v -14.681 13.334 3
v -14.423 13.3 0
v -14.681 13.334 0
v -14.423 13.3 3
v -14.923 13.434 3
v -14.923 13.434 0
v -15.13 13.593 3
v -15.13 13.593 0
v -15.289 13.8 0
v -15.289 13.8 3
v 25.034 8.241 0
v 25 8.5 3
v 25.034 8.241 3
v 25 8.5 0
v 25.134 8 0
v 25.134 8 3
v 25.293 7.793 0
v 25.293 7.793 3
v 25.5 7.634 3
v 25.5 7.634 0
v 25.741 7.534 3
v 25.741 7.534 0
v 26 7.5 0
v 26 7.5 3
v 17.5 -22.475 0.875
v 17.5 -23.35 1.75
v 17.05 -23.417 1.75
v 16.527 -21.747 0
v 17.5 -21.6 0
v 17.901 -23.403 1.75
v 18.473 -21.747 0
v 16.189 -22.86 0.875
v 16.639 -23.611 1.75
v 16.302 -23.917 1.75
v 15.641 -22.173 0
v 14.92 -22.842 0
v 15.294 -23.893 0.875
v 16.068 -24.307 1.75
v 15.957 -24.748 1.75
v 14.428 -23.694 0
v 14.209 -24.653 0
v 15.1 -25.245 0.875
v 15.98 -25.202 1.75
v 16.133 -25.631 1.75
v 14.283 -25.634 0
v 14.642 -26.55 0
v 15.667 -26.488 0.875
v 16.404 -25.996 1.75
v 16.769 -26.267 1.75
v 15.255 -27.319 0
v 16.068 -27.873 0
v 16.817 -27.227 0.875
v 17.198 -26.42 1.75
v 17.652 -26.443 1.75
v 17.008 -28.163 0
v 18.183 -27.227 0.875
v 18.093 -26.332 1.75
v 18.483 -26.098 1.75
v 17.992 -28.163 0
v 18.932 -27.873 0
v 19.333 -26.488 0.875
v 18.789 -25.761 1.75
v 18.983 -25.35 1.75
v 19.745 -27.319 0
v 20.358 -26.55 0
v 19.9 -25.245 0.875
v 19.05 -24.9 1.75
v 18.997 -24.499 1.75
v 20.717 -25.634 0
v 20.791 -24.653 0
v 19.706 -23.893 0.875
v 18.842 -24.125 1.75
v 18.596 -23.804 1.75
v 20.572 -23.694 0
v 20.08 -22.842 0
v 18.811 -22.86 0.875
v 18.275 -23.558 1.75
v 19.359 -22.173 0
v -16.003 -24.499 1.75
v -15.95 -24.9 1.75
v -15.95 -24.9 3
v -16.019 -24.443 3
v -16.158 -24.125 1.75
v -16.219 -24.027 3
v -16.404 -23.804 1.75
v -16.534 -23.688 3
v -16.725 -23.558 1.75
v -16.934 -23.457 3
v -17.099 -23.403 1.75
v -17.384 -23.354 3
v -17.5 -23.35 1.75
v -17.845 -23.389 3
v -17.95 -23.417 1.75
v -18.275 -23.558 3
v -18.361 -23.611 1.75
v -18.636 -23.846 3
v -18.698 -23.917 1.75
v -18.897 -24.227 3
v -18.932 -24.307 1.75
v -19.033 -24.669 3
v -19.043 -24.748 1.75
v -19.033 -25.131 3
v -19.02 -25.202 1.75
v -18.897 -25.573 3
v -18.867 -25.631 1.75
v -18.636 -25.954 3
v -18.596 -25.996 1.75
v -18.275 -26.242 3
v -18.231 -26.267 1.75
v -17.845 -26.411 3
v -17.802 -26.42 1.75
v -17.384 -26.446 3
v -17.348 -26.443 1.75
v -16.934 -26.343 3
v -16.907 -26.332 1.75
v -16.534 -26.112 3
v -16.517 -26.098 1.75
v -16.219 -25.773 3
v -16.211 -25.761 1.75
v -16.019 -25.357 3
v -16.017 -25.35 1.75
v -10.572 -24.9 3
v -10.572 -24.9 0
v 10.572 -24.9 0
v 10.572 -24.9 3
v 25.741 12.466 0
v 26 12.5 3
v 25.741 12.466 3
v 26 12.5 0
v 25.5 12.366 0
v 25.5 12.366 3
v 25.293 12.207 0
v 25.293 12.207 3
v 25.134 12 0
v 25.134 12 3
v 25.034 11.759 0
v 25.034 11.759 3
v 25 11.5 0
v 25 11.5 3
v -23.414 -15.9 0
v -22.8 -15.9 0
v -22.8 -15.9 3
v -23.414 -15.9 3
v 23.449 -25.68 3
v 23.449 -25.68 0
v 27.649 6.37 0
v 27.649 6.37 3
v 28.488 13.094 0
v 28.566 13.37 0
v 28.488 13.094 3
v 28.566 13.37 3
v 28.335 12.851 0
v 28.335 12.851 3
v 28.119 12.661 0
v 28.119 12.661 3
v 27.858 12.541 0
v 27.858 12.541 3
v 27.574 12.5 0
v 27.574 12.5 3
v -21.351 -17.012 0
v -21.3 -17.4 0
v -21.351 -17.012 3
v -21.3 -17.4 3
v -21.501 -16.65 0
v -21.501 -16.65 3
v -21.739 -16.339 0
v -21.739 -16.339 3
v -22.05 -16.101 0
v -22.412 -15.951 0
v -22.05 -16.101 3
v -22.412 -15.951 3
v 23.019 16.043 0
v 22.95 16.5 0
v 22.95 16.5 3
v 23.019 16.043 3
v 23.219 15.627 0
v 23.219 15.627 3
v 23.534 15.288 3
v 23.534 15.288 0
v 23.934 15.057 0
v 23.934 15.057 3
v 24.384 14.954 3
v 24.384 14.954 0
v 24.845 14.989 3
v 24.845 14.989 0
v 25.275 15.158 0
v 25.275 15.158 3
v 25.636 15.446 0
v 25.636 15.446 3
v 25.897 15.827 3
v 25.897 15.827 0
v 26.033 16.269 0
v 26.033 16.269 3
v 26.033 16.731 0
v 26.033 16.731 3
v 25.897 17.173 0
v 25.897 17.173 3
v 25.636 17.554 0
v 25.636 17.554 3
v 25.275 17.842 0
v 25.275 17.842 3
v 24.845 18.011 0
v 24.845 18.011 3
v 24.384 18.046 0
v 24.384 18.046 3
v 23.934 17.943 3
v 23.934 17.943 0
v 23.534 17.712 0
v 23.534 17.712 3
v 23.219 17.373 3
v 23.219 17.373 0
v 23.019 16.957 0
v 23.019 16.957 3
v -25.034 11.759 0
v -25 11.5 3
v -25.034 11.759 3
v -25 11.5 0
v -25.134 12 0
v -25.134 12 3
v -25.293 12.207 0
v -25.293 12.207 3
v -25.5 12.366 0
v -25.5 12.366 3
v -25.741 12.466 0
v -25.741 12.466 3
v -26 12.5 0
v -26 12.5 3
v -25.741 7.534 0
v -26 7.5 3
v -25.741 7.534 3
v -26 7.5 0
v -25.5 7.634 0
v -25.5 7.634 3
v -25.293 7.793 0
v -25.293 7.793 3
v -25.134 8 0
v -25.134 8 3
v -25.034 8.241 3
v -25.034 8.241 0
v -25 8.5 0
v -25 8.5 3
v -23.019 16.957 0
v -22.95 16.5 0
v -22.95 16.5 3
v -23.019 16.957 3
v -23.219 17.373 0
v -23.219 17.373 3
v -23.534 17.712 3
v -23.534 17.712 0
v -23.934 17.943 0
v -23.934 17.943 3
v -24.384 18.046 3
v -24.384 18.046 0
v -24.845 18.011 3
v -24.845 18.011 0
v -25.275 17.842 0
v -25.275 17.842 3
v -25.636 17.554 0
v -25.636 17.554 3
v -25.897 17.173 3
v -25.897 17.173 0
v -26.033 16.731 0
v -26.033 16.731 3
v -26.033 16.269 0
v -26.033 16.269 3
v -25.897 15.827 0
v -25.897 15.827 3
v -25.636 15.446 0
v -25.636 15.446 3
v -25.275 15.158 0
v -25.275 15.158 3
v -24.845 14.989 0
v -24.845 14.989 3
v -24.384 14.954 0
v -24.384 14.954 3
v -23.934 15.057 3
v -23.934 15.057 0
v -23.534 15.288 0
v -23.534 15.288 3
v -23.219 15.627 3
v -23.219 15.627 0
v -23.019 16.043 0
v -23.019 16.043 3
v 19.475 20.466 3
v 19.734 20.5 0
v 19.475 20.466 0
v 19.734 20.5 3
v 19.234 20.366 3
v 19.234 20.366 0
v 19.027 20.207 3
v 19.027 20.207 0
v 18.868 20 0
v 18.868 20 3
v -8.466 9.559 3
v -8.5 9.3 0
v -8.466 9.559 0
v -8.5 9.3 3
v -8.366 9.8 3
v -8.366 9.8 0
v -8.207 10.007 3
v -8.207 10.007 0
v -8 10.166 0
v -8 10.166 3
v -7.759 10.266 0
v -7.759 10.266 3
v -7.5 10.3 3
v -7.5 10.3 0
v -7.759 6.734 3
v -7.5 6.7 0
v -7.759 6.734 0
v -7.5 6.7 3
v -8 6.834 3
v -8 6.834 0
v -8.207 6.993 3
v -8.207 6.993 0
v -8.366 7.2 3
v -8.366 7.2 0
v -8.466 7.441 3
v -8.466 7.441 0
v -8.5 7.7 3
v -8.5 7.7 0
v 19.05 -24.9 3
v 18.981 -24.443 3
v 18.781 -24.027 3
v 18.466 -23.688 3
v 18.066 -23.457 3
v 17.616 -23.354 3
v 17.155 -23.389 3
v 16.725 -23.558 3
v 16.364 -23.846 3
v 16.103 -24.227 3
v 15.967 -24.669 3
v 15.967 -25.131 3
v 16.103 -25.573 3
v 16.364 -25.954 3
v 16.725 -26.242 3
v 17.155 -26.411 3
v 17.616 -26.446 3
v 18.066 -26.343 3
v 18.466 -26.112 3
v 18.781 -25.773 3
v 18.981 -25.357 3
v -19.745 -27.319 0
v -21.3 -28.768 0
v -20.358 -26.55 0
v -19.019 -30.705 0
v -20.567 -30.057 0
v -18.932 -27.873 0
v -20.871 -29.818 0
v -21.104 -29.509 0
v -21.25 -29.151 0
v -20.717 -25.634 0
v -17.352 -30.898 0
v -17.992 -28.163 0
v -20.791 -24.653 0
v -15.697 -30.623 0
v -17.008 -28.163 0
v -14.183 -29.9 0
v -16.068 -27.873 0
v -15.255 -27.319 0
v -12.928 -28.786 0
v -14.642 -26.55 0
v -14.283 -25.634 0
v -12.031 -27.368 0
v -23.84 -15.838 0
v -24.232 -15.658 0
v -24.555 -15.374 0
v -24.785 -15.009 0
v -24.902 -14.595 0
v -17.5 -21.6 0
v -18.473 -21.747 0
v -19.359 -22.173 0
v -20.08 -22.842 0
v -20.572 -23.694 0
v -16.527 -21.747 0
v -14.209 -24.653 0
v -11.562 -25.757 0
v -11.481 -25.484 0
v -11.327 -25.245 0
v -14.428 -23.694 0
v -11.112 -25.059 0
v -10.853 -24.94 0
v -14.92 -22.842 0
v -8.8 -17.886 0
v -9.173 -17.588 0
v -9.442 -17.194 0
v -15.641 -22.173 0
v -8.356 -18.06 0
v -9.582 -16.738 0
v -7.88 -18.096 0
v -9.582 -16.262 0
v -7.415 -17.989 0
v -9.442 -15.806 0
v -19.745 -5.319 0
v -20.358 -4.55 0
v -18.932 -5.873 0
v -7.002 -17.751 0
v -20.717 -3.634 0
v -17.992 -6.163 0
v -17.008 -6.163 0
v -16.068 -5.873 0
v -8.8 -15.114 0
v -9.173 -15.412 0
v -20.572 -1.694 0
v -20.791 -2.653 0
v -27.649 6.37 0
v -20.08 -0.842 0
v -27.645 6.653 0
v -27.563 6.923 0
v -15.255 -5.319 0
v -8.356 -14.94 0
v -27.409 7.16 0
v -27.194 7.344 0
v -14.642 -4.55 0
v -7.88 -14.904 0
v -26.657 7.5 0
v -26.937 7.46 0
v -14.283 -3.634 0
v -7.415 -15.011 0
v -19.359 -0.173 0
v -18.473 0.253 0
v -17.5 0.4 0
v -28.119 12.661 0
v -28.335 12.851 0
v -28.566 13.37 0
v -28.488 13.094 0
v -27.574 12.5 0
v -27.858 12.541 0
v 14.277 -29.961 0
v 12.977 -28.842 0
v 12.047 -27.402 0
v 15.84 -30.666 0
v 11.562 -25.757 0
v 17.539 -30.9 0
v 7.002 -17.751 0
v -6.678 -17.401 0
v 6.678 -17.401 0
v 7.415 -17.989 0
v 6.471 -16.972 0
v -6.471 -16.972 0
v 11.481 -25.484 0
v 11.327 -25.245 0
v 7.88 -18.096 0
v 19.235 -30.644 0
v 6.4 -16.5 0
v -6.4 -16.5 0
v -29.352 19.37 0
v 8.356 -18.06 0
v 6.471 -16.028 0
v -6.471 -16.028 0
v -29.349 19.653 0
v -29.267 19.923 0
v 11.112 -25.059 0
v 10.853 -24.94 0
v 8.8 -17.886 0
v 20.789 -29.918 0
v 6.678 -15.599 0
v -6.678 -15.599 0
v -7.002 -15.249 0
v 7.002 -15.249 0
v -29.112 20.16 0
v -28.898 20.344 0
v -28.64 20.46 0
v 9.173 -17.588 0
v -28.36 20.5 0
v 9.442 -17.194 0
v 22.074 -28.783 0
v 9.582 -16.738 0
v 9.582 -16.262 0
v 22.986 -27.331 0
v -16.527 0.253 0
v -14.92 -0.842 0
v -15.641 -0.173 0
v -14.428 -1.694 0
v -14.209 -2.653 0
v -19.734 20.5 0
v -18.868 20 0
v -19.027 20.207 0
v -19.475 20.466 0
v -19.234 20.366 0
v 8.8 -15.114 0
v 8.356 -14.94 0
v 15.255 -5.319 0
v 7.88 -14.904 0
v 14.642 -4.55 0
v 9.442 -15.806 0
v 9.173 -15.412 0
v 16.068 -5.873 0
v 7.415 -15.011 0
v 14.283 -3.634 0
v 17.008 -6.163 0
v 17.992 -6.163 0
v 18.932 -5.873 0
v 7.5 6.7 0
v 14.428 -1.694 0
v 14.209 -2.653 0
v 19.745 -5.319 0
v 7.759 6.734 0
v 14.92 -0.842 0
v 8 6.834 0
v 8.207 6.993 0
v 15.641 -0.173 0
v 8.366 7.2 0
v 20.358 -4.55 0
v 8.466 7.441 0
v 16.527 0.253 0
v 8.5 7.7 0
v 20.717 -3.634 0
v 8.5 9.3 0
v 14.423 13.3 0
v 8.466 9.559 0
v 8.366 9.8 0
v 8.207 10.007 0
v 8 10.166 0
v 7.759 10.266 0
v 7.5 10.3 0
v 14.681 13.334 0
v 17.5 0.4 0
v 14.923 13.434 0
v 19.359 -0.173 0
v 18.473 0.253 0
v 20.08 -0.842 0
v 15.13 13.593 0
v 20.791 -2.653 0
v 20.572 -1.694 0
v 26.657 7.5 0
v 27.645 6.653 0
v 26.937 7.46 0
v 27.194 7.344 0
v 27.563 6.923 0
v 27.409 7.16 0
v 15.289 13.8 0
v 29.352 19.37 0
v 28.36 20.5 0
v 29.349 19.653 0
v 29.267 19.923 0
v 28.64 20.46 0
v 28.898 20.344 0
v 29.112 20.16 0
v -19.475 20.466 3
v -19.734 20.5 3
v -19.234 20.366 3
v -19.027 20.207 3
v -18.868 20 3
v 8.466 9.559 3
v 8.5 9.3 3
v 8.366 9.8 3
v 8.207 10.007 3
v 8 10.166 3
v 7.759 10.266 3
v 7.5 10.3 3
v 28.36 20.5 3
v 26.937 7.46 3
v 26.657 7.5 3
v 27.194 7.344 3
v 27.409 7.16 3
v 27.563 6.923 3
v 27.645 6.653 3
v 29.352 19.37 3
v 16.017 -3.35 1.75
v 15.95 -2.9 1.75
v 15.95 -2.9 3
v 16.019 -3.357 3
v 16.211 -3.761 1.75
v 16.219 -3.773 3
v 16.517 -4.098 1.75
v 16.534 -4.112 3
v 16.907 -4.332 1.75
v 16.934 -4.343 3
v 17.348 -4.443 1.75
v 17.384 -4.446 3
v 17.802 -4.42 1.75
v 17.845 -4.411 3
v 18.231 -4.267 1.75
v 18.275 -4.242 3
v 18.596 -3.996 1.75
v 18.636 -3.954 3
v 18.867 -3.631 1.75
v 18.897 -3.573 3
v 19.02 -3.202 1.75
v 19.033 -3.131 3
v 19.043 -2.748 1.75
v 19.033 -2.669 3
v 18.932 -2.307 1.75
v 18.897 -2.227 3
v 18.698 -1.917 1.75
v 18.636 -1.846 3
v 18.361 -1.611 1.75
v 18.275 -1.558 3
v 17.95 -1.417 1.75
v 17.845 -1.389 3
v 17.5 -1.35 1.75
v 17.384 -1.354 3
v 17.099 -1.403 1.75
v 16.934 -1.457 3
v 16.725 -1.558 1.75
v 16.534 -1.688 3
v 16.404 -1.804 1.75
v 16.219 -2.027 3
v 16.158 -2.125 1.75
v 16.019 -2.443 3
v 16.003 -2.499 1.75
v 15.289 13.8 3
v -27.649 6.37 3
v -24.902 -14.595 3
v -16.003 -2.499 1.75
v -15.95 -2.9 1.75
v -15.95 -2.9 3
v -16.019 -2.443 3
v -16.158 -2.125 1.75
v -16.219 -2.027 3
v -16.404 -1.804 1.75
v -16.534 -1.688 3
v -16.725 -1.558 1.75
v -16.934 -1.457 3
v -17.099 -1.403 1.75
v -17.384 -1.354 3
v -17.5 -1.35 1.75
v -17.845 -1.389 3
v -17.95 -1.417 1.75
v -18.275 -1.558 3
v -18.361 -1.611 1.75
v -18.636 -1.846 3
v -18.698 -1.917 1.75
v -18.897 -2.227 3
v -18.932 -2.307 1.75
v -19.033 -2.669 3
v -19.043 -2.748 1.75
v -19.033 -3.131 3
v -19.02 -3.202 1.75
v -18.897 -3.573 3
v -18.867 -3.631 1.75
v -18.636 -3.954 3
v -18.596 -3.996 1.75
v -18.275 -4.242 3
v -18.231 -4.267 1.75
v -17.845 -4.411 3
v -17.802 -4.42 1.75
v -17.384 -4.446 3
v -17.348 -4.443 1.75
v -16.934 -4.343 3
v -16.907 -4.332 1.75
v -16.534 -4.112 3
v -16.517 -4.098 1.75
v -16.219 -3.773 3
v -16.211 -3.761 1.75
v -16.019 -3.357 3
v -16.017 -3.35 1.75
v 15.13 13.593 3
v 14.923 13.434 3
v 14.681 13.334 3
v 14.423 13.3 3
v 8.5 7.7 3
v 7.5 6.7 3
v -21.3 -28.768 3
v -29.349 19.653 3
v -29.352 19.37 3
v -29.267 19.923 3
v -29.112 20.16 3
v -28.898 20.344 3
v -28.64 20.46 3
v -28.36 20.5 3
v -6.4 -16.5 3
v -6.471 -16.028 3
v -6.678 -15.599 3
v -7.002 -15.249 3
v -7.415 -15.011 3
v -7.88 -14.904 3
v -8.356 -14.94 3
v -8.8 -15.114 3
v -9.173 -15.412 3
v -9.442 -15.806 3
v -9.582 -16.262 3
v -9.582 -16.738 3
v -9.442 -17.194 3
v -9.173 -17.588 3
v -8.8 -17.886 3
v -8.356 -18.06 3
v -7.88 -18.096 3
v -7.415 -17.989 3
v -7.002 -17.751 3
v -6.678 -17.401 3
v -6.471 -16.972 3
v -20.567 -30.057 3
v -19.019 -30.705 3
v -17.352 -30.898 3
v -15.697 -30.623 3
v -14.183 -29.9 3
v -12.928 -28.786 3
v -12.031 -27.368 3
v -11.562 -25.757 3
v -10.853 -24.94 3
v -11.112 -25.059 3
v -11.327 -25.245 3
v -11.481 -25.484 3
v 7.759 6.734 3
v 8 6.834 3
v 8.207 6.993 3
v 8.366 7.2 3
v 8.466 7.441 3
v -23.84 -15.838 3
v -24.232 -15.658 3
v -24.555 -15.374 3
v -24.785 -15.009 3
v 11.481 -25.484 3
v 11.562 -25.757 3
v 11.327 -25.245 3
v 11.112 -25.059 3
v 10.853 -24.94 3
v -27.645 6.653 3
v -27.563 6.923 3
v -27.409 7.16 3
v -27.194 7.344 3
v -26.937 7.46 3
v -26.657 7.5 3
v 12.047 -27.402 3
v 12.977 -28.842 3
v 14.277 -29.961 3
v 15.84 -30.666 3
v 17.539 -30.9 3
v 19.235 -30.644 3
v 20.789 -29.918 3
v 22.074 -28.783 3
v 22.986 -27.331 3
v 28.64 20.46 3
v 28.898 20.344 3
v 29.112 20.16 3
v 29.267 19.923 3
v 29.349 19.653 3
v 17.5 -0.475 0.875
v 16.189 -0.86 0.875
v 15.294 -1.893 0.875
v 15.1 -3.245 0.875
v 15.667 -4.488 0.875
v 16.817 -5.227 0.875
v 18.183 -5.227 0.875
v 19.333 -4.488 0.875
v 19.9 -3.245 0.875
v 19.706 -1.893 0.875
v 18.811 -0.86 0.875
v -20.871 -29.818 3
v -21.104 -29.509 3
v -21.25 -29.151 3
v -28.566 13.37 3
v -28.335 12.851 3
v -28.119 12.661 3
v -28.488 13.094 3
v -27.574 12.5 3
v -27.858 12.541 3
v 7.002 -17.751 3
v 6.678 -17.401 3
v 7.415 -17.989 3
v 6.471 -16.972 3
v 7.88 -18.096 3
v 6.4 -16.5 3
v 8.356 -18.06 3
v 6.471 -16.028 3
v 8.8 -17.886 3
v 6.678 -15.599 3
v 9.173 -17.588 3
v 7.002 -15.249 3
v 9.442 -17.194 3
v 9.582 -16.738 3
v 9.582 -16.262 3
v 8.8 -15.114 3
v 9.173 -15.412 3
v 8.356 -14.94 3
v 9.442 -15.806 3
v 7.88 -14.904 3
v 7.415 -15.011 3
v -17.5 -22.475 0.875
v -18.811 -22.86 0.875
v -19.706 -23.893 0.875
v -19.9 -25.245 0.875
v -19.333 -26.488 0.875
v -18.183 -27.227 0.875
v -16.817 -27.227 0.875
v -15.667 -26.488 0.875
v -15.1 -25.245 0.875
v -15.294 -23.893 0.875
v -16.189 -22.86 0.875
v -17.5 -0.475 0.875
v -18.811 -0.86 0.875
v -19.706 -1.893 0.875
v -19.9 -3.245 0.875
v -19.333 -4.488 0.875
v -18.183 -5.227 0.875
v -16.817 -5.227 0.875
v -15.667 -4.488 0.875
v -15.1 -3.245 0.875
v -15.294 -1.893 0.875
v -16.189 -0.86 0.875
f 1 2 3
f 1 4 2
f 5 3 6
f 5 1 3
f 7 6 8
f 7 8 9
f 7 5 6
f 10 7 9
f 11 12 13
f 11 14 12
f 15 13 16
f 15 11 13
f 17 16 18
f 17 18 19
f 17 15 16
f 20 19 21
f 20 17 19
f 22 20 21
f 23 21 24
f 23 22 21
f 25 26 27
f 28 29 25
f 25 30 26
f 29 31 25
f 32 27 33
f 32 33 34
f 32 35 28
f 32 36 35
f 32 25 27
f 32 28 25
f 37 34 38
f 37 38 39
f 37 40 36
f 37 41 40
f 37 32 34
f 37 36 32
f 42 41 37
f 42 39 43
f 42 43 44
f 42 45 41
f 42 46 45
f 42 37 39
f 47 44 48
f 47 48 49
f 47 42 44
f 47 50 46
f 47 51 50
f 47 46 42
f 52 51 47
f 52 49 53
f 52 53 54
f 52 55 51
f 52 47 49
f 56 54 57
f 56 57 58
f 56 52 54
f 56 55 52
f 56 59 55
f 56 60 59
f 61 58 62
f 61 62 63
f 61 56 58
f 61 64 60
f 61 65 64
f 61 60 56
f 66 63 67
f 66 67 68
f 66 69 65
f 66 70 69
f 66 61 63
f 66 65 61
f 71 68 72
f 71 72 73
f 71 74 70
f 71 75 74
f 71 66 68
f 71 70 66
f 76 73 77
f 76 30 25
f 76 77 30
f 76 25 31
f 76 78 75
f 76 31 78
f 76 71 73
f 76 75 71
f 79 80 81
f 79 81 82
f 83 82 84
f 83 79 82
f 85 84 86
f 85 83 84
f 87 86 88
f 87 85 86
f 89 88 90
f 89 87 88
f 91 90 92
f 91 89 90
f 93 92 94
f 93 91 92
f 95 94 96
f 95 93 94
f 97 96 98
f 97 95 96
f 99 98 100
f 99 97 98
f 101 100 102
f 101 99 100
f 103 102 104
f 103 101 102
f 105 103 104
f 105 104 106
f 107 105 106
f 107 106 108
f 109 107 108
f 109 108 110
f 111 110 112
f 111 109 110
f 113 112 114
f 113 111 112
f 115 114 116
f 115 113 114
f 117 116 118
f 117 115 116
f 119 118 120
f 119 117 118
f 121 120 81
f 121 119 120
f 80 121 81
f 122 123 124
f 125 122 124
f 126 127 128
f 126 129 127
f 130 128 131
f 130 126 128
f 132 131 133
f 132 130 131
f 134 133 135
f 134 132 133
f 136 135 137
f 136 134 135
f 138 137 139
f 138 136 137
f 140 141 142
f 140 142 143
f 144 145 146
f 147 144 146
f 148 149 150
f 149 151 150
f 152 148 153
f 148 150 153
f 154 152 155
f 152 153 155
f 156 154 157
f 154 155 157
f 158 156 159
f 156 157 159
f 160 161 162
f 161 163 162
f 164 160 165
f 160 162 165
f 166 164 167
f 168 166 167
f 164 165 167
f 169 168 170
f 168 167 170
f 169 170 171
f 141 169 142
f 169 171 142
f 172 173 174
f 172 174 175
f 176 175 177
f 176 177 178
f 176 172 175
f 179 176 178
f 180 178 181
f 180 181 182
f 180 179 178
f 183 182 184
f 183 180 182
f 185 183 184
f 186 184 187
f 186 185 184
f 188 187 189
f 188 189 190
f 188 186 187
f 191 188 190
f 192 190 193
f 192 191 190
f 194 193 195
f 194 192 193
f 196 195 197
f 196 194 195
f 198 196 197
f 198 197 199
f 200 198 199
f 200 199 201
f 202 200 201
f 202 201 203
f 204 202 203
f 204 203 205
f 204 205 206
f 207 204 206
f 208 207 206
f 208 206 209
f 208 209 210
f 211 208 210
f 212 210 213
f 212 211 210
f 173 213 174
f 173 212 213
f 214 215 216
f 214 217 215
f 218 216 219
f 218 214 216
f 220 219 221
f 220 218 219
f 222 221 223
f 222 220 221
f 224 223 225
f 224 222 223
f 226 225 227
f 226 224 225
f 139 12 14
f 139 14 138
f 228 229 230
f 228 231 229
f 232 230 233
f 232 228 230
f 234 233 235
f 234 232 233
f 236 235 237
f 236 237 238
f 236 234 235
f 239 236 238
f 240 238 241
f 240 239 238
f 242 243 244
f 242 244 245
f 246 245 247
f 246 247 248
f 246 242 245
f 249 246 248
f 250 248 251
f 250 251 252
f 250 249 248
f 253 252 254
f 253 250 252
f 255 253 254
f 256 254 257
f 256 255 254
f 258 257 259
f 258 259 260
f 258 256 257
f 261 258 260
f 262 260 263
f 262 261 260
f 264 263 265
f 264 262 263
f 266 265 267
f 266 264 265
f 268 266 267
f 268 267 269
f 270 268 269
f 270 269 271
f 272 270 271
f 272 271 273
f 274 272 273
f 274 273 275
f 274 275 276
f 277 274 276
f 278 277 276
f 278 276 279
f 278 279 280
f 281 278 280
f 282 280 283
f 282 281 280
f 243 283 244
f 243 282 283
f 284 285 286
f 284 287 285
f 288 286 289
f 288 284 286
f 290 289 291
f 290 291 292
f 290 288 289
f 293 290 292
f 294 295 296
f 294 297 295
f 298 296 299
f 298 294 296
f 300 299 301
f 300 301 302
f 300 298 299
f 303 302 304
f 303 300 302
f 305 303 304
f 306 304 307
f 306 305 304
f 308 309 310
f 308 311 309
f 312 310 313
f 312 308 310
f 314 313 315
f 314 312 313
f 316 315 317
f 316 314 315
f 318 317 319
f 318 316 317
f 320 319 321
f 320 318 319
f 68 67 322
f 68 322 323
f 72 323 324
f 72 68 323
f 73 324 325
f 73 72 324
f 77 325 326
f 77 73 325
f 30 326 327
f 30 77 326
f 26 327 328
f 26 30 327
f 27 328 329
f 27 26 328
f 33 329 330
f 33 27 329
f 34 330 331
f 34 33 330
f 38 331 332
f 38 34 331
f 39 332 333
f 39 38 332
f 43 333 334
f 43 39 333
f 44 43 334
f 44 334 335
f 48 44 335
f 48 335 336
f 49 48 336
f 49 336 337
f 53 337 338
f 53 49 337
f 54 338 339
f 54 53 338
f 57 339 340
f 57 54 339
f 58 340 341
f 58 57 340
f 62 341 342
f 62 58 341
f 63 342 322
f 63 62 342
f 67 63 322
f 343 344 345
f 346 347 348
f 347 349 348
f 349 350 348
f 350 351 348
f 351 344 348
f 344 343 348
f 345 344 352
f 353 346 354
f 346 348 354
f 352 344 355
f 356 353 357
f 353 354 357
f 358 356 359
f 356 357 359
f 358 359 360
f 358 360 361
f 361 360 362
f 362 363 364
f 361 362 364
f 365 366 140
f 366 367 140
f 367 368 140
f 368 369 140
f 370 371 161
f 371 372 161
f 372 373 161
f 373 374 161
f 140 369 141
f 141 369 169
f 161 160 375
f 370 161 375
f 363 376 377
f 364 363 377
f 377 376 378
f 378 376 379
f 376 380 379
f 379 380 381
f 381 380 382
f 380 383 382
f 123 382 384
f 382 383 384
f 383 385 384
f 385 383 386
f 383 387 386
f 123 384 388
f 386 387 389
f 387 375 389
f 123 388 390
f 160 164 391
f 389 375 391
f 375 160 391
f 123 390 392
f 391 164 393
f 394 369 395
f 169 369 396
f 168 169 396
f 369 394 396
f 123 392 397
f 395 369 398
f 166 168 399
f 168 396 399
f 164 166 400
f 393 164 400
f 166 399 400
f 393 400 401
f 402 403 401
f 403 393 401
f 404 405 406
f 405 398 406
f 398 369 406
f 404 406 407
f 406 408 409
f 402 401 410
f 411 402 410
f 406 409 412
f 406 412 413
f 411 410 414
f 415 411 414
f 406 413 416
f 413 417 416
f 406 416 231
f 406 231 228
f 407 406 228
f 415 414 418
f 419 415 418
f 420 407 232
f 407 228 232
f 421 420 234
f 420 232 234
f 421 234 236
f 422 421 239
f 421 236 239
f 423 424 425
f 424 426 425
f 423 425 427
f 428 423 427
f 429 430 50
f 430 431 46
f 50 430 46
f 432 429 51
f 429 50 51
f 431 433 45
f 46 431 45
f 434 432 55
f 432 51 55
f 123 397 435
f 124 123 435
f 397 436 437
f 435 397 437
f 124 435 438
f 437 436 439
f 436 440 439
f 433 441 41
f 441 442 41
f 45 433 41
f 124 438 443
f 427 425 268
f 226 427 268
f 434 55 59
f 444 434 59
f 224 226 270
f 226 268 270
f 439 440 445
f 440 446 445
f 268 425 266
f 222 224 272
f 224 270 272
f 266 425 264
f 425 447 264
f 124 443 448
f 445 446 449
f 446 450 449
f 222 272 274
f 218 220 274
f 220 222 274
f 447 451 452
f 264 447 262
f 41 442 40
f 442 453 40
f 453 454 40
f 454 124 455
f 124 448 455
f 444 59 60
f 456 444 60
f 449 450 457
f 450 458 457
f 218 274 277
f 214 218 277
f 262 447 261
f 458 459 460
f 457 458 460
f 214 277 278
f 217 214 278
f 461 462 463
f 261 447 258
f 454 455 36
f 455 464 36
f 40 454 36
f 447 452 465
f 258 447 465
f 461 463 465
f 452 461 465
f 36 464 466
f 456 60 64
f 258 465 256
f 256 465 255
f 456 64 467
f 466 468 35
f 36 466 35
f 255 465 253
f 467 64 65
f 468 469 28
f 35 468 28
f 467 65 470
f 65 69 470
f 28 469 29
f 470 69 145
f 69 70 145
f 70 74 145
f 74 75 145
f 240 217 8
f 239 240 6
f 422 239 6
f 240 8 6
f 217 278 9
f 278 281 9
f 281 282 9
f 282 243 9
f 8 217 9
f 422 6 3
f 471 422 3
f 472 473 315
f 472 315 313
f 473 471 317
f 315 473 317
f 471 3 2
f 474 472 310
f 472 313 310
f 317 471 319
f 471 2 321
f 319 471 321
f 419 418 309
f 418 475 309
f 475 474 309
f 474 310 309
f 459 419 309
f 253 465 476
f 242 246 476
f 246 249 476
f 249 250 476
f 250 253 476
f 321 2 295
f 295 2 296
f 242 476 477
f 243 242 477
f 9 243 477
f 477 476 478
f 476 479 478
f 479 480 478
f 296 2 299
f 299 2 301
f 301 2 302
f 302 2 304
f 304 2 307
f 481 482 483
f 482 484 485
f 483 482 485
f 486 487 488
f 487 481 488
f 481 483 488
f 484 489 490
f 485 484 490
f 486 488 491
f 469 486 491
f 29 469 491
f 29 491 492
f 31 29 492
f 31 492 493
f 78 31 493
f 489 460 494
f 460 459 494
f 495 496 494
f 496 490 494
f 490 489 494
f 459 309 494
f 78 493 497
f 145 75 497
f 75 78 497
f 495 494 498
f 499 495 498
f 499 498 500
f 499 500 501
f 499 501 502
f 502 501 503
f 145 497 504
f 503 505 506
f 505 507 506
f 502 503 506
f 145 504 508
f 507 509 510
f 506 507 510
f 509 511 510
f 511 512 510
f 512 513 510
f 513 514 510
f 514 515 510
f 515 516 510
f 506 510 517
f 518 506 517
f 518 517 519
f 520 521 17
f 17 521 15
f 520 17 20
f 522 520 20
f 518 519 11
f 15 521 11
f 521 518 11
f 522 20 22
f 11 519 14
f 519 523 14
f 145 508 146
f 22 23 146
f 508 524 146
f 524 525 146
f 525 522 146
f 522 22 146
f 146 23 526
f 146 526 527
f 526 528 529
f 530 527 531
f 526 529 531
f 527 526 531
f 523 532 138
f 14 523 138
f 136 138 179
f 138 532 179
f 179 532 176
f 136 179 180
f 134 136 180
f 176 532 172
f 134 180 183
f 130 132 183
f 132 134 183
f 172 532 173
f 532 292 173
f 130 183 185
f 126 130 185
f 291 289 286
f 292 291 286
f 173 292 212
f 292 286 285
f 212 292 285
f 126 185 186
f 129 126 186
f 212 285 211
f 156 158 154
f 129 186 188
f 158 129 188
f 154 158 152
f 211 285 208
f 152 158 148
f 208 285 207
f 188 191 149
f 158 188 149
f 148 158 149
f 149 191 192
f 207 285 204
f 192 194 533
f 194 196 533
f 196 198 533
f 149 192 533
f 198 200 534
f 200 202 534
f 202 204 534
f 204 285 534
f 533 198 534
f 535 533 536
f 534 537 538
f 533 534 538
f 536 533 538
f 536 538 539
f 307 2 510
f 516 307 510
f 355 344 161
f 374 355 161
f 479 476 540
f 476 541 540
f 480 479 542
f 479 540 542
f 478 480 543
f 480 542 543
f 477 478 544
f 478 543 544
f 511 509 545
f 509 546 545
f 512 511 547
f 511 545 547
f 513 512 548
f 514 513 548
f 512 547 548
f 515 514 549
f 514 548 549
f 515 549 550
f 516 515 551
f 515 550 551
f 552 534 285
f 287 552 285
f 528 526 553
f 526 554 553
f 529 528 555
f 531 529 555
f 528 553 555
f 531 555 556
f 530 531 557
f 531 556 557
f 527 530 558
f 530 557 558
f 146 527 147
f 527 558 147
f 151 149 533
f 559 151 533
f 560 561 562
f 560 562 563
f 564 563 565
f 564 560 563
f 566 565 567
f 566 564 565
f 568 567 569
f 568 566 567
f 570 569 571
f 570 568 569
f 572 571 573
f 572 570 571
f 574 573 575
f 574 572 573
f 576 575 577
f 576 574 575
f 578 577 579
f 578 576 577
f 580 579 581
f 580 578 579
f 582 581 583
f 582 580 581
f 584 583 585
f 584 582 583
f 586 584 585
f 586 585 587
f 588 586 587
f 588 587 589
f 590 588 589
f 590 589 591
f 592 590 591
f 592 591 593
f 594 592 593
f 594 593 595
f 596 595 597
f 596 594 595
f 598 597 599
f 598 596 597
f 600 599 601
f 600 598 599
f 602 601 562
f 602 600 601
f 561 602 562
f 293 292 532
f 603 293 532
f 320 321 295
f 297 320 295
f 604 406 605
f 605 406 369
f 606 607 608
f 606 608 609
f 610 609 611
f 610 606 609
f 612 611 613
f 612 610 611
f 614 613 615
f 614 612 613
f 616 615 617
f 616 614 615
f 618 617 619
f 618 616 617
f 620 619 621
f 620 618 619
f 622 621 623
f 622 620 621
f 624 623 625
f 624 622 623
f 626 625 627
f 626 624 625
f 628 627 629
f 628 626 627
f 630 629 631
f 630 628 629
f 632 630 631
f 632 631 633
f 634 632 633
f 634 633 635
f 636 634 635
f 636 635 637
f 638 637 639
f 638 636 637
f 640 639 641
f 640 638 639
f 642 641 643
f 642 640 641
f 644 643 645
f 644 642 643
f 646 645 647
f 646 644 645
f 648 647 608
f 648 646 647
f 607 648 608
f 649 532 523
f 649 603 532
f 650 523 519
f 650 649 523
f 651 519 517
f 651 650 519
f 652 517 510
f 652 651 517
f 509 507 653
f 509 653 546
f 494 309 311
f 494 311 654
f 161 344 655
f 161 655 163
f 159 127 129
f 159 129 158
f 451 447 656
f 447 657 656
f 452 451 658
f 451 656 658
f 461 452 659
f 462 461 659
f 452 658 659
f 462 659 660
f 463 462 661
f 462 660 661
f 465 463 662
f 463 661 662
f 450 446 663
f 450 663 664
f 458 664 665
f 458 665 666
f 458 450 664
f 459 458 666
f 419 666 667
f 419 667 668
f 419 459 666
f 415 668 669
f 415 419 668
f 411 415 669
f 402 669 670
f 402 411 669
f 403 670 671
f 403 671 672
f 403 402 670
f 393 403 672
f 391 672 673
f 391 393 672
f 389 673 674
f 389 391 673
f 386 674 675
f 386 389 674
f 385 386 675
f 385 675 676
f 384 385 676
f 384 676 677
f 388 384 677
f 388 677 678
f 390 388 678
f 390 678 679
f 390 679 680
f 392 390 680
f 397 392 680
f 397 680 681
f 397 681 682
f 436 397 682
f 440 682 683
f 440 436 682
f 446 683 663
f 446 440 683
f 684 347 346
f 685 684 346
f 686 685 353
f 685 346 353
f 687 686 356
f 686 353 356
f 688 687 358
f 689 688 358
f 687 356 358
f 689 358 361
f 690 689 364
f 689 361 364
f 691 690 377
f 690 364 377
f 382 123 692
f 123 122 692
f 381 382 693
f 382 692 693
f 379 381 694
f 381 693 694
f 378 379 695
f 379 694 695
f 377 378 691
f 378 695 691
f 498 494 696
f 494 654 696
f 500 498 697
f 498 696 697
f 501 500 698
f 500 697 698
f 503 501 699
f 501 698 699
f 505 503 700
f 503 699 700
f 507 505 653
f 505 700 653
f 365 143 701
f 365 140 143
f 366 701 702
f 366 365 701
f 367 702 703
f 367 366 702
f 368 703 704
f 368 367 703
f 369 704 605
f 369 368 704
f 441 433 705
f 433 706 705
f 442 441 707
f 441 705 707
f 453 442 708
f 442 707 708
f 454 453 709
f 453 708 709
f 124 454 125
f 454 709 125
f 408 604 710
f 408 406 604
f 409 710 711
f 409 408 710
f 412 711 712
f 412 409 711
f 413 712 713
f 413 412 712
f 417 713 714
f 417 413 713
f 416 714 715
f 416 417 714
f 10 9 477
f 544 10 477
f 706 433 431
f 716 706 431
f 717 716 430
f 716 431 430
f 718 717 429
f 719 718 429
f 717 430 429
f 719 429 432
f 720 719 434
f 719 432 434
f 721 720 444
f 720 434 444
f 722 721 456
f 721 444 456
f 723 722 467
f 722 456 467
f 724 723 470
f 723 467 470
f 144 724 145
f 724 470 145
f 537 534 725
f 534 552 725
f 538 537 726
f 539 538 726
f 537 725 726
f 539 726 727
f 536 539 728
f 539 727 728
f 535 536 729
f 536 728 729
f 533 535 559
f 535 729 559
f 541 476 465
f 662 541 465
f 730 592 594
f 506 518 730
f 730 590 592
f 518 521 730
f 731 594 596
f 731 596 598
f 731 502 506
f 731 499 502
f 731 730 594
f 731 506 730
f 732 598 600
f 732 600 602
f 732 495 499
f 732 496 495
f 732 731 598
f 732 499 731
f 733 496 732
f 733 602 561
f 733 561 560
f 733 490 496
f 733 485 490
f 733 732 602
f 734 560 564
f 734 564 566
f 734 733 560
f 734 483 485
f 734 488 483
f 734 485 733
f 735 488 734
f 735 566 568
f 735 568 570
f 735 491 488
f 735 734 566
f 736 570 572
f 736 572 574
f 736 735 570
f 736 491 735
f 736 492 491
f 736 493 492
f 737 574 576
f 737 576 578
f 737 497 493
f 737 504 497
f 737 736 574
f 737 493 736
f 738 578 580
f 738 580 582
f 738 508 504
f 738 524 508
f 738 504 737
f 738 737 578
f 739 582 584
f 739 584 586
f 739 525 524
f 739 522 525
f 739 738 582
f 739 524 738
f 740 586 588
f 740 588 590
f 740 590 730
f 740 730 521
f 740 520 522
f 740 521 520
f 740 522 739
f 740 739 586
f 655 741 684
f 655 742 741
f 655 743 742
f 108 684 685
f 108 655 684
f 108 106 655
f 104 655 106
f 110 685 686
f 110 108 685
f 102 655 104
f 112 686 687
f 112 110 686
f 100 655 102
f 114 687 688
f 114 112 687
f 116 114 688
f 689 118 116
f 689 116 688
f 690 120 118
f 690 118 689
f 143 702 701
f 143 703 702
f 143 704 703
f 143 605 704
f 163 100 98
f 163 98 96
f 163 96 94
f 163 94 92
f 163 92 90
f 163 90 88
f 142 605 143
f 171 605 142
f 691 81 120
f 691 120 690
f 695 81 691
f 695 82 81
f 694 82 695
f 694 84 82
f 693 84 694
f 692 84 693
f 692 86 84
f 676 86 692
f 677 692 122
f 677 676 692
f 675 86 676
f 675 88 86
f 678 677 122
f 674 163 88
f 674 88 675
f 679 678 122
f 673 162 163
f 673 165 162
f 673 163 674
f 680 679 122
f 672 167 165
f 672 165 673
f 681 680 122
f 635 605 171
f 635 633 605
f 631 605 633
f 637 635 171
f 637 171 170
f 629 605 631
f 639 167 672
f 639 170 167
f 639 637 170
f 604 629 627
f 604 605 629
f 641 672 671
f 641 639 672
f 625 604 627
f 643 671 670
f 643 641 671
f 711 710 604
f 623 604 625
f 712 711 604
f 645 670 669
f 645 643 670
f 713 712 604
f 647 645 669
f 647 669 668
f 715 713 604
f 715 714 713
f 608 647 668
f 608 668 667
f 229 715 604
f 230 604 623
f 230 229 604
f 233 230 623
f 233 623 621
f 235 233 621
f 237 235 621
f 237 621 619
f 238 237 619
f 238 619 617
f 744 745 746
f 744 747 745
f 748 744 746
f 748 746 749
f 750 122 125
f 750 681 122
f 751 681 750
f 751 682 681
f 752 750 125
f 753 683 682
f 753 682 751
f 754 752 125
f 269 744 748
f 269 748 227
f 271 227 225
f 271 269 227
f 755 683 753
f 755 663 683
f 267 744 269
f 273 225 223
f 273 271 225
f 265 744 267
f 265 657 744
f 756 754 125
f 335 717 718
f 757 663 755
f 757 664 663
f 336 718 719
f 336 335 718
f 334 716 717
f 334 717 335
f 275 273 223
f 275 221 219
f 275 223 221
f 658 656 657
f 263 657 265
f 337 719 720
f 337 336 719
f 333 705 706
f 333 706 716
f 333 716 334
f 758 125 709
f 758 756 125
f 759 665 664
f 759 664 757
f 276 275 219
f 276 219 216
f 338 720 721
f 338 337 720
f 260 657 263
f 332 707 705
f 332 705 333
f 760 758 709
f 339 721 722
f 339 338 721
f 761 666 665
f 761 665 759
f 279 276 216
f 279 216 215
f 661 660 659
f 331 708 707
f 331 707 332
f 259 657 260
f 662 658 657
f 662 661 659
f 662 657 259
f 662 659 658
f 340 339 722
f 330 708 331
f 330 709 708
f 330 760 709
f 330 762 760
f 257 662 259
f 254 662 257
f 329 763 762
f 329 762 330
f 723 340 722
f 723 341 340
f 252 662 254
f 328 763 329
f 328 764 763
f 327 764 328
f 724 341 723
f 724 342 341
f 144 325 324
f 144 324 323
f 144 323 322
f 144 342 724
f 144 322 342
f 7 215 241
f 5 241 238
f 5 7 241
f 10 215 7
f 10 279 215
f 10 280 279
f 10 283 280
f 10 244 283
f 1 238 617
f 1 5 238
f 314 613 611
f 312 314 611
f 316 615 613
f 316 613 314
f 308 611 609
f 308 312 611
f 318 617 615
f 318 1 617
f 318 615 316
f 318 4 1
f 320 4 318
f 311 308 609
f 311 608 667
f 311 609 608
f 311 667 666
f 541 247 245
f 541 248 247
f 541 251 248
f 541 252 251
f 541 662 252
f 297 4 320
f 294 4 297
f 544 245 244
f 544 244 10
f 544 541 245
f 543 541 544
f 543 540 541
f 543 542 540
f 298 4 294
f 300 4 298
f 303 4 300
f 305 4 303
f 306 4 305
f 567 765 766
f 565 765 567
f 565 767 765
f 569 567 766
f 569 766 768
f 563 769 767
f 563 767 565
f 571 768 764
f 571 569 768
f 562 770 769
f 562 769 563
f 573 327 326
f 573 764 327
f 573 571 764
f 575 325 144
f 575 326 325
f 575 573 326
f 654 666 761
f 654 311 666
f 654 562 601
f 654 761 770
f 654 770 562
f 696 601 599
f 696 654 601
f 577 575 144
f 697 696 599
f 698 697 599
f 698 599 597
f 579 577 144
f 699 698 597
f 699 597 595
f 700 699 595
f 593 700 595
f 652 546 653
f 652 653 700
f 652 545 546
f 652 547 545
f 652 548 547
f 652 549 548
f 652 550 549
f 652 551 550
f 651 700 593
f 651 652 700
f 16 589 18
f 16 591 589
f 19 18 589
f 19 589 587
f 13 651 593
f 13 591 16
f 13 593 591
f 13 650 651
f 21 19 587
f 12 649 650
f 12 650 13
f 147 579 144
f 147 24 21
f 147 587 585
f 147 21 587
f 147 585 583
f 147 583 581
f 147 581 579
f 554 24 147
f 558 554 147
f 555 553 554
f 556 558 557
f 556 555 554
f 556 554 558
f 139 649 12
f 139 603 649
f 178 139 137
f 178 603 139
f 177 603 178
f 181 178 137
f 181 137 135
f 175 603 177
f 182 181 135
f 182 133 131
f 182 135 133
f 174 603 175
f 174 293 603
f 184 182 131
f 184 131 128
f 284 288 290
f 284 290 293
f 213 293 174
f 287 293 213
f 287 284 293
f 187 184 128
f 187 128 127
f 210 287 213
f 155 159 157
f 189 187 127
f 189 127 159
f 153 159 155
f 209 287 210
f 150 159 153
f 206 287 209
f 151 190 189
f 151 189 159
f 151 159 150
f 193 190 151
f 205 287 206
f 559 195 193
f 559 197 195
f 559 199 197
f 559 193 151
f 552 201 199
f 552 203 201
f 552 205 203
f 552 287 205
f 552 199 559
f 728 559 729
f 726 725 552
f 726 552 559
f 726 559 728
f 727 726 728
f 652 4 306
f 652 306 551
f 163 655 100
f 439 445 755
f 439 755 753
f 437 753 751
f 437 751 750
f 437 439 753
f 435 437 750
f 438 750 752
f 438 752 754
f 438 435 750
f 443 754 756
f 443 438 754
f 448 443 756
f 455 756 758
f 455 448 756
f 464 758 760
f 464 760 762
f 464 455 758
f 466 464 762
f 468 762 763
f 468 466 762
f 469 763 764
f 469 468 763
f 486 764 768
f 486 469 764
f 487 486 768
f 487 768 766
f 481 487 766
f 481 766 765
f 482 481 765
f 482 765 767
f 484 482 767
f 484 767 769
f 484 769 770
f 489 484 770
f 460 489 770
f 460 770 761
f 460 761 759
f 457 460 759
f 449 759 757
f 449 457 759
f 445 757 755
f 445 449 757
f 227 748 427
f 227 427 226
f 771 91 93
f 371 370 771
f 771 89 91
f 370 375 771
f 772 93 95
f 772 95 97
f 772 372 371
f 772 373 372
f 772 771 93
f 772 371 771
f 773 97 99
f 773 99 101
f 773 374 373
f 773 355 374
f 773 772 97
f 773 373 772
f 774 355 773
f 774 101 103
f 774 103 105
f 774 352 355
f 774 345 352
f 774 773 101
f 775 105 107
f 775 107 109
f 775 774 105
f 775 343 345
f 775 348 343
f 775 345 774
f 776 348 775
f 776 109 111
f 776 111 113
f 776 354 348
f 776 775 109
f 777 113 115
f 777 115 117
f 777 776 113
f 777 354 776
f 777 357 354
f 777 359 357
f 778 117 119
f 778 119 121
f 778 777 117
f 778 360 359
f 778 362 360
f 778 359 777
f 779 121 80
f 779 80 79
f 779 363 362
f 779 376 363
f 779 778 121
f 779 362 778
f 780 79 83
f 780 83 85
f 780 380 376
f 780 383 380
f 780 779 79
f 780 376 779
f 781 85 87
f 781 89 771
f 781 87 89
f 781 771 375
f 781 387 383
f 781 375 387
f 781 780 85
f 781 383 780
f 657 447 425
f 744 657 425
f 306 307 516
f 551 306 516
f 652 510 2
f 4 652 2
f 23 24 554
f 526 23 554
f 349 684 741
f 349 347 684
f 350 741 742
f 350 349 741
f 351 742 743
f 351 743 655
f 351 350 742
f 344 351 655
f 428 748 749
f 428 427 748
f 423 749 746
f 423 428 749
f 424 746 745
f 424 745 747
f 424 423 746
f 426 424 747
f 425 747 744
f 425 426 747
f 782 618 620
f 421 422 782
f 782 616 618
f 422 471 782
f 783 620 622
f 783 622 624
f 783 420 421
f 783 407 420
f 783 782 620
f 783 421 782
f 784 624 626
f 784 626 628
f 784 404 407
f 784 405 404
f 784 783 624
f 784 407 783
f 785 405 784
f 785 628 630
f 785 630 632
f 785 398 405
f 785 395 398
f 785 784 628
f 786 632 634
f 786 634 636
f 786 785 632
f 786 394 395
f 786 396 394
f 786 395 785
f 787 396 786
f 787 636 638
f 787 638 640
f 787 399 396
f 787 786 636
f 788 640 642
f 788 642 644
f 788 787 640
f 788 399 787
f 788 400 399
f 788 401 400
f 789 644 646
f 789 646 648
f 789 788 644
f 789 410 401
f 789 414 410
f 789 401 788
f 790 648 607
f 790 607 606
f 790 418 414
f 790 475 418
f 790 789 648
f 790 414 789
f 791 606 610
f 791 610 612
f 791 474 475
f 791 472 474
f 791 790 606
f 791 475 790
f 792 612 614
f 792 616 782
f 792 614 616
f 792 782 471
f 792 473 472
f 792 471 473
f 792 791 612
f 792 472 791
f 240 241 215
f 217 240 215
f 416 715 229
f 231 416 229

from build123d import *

# Parameters (mm, degrees)
SKETCH_1_R               = 1.55
SKETCH_1_R_2             = 1.6
SKETCH_1_W               = 17
SKETCH_1_H               = 3.6
EXTRUDE_1_DEPTH          = 3
HOLE_WIZARD_1_AT_2_COUNT = 2
HOLE_WIZARD_1_AT_2_PITCH = 41.340053217
HOLE_WIZARD_1_AT_3_COUNT = 2
HOLE_WIZARD_1_AT_3_PITCH = 22
HOLE_WIZARD_1_AT_4_COUNT = 2
HOLE_WIZARD_1_AT_4_PITCH = 35
SKETCH_3_W               = 9
SKETCH_3_H               = 5
CUT_EXTRUDE_1_DEPTH      = 10
FILLET_1_R               = 1
SKETCH_4_W               = 16.565491158
SKETCH_4_H               = 15
CUT_EXTRUDE_2_DEPTH      = 10
FILLET_2_R               = 1.5


with BuildPart() as part:
    # 草图1 → 凸台-拉伸1 (new body)
    with BuildSketch(Plane.XY):
        with BuildLine():
            Line((29.5, 20.5), (19.156921938, 20.5))
            Line((19.156921938, 20.5), (15, 13.3))
            Line((15, 13.3), (-15, 13.3))
            Line((-15, 13.3), (-19.156921938, 20.5))
            Line((-19.156921938, 20.5), (-29.5, 20.5))
            Line((-29.5, 20.5), (-23.44914812, -25.679510516))
            ThreePointArc((-23.44914812, -25.679510516), (-17.109416283, -30.887273533), (-11.5, -24.9))
            Line((-11.5, -24.9), (11.5, -24.9))
            ThreePointArc((11.5, -24.9), (17.109416283, -30.887273533), (23.44914812, -25.679510516))
            Line((23.44914812, -25.679510516), (29.5, 20.5))
        make_face()
        with Locations((-24.5, 16.5)):
            Circle(SKETCH_1_R, mode=Mode.SUBTRACT)
        with Locations((-8, -16.5)):
            Circle(SKETCH_1_R_2, mode=Mode.SUBTRACT)
        with Locations(Location((8, -16.5, 0), (0, 0, 180))):
            Circle(SKETCH_1_R_2, mode=Mode.SUBTRACT)
        with Locations(Location((24.5, 16.5, 0), (0, 0, 180))):
            Circle(SKETCH_1_R, mode=Mode.SUBTRACT)
        with Locations((-17.5, -24.9)):
            Circle(SKETCH_1_R, mode=Mode.SUBTRACT)
        with Locations((17.5, -24.9)):
            Circle(SKETCH_1_R, mode=Mode.SUBTRACT)
        with Locations((-17.5, -2.9)):
            Circle(SKETCH_1_R, mode=Mode.SUBTRACT)
        with Locations(Location((17.5, -2.9, 0), (0, 0, 180))):
            Circle(SKETCH_1_R, mode=Mode.SUBTRACT)
        with Locations((0, 8.5)):
            Rectangle(SKETCH_1_W, SKETCH_1_H, mode=Mode.SUBTRACT)
    extrude(amount=EXTRUDE_1_DEPTH)

    # 草图2 → 打孔尺寸(%根据十字)槽沉头木螺钉的类型1 (revolve, cut)
    with BuildSketch(Plane(origin=(-17.5, -24.9, 0), x_dir=(0, 1, 0), z_dir=(1, 0, 0))):
        Polygon((0, 0), (0, 3), (1.55, 3), (1.55, 1.75), (3.3, 0), align=None)
    hole_wizard_1 = revolve(axis=Axis((-17.5, -24.9, -6.35), (0, 0, 1)), mode=Mode.SUBTRACT)

    # 打孔尺寸(%根据十字)槽沉头木螺钉的类型1 at 2: 打孔尺寸(%根据十字)槽沉头木螺钉的类型1 ×2
    with Locations(*[Vector(0.846636549211005, 0.5321715452183458, 0) * (i * HOLE_WIZARD_1_AT_2_PITCH) for i in range(1, HOLE_WIZARD_1_AT_2_COUNT)]):
        add(hole_wizard_1, mode=Mode.SUBTRACT)

    # 打孔尺寸(%根据十字)槽沉头木螺钉的类型1 at 3: 打孔尺寸(%根据十字)槽沉头木螺钉的类型1 ×2
    with Locations(*[(0, i * HOLE_WIZARD_1_AT_3_PITCH, 0) for i in range(1, HOLE_WIZARD_1_AT_3_COUNT)]):
        add(hole_wizard_1, mode=Mode.SUBTRACT)

    # 打孔尺寸(%根据十字)槽沉头木螺钉的类型1 at 4: 打孔尺寸(%根据十字)槽沉头木螺钉的类型1 ×2
    with Locations(*[(i * HOLE_WIZARD_1_AT_4_PITCH, 0, 0) for i in range(1, HOLE_WIZARD_1_AT_4_COUNT)]):
        add(hole_wizard_1, mode=Mode.SUBTRACT)

    # 草图3 → 切除-拉伸1 (cut)
    with BuildSketch(Plane.XY.offset(3)):
        with Locations((29.5, 10)):
            Rectangle(SKETCH_3_W, SKETCH_3_H)
        with Locations((-29.5, 10)):
            Rectangle(SKETCH_3_W, SKETCH_3_H)
    extrude(amount=-CUT_EXTRUDE_1_DEPTH, mode=Mode.SUBTRACT)

    # 圆角1
    fillet_1_edges = [part.edges().sort_by_distance(p)[0] for p in [
        (28.451768555, 12.5, 1.5),
        (27.796623902, 7.5, 1.5),
        (-28.451768555, 12.5, 1.5),
        (-27.796623902, 7.5, 1.5),
        (25, 7.5, 1.5),
        (25, 12.5, 1.5),
        (-25, 12.5, 1.5),
        (-25, 7.5, 1.5),
        (-19.156921938, 20.5, 1.5),
        (-15, 13.3, 1.5),
        (15, 13.3, 1.5),
        (19.156921938, 20.5, 1.5),
        (29.5, 20.5, 1.5),
        (11.5, -24.9, 1.5),
        (-11.5, -24.9, 1.5),
        (-29.5, 20.5, 1.5),
        (8.5, 6.7, 1.5),
        (8.5, 10.3, 1.5),
        (-8.5, 10.3, 1.5),
        (-8.5, 6.7, 1.5),
    ]]
    fillet(fillet_1_edges, radius=FILLET_1_R)

    # 草图4 → 切除-拉伸2 (cut)
    with BuildSketch(Plane(origin=(0, 0, 0), x_dir=(-1, 0, 0), z_dir=(0, 0, -1))):
        with Locations((29.582745579, -23.4)):
            Rectangle(SKETCH_4_W, SKETCH_4_H)
    extrude(amount=-CUT_EXTRUDE_2_DEPTH, mode=Mode.SUBTRACT)

    # 圆角2
    fillet_2_edges = [part.edges().sort_by_distance(p)[0] for p in [
        (-21.3, -29.543274706, 1.5),
        (-24.730546925, -15.9, 1.5),
        (-21.3, -15.9, 1.5),
    ]]
    fillet(fillet_2_edges, radius=FILLET_2_R)


solid = part.part
